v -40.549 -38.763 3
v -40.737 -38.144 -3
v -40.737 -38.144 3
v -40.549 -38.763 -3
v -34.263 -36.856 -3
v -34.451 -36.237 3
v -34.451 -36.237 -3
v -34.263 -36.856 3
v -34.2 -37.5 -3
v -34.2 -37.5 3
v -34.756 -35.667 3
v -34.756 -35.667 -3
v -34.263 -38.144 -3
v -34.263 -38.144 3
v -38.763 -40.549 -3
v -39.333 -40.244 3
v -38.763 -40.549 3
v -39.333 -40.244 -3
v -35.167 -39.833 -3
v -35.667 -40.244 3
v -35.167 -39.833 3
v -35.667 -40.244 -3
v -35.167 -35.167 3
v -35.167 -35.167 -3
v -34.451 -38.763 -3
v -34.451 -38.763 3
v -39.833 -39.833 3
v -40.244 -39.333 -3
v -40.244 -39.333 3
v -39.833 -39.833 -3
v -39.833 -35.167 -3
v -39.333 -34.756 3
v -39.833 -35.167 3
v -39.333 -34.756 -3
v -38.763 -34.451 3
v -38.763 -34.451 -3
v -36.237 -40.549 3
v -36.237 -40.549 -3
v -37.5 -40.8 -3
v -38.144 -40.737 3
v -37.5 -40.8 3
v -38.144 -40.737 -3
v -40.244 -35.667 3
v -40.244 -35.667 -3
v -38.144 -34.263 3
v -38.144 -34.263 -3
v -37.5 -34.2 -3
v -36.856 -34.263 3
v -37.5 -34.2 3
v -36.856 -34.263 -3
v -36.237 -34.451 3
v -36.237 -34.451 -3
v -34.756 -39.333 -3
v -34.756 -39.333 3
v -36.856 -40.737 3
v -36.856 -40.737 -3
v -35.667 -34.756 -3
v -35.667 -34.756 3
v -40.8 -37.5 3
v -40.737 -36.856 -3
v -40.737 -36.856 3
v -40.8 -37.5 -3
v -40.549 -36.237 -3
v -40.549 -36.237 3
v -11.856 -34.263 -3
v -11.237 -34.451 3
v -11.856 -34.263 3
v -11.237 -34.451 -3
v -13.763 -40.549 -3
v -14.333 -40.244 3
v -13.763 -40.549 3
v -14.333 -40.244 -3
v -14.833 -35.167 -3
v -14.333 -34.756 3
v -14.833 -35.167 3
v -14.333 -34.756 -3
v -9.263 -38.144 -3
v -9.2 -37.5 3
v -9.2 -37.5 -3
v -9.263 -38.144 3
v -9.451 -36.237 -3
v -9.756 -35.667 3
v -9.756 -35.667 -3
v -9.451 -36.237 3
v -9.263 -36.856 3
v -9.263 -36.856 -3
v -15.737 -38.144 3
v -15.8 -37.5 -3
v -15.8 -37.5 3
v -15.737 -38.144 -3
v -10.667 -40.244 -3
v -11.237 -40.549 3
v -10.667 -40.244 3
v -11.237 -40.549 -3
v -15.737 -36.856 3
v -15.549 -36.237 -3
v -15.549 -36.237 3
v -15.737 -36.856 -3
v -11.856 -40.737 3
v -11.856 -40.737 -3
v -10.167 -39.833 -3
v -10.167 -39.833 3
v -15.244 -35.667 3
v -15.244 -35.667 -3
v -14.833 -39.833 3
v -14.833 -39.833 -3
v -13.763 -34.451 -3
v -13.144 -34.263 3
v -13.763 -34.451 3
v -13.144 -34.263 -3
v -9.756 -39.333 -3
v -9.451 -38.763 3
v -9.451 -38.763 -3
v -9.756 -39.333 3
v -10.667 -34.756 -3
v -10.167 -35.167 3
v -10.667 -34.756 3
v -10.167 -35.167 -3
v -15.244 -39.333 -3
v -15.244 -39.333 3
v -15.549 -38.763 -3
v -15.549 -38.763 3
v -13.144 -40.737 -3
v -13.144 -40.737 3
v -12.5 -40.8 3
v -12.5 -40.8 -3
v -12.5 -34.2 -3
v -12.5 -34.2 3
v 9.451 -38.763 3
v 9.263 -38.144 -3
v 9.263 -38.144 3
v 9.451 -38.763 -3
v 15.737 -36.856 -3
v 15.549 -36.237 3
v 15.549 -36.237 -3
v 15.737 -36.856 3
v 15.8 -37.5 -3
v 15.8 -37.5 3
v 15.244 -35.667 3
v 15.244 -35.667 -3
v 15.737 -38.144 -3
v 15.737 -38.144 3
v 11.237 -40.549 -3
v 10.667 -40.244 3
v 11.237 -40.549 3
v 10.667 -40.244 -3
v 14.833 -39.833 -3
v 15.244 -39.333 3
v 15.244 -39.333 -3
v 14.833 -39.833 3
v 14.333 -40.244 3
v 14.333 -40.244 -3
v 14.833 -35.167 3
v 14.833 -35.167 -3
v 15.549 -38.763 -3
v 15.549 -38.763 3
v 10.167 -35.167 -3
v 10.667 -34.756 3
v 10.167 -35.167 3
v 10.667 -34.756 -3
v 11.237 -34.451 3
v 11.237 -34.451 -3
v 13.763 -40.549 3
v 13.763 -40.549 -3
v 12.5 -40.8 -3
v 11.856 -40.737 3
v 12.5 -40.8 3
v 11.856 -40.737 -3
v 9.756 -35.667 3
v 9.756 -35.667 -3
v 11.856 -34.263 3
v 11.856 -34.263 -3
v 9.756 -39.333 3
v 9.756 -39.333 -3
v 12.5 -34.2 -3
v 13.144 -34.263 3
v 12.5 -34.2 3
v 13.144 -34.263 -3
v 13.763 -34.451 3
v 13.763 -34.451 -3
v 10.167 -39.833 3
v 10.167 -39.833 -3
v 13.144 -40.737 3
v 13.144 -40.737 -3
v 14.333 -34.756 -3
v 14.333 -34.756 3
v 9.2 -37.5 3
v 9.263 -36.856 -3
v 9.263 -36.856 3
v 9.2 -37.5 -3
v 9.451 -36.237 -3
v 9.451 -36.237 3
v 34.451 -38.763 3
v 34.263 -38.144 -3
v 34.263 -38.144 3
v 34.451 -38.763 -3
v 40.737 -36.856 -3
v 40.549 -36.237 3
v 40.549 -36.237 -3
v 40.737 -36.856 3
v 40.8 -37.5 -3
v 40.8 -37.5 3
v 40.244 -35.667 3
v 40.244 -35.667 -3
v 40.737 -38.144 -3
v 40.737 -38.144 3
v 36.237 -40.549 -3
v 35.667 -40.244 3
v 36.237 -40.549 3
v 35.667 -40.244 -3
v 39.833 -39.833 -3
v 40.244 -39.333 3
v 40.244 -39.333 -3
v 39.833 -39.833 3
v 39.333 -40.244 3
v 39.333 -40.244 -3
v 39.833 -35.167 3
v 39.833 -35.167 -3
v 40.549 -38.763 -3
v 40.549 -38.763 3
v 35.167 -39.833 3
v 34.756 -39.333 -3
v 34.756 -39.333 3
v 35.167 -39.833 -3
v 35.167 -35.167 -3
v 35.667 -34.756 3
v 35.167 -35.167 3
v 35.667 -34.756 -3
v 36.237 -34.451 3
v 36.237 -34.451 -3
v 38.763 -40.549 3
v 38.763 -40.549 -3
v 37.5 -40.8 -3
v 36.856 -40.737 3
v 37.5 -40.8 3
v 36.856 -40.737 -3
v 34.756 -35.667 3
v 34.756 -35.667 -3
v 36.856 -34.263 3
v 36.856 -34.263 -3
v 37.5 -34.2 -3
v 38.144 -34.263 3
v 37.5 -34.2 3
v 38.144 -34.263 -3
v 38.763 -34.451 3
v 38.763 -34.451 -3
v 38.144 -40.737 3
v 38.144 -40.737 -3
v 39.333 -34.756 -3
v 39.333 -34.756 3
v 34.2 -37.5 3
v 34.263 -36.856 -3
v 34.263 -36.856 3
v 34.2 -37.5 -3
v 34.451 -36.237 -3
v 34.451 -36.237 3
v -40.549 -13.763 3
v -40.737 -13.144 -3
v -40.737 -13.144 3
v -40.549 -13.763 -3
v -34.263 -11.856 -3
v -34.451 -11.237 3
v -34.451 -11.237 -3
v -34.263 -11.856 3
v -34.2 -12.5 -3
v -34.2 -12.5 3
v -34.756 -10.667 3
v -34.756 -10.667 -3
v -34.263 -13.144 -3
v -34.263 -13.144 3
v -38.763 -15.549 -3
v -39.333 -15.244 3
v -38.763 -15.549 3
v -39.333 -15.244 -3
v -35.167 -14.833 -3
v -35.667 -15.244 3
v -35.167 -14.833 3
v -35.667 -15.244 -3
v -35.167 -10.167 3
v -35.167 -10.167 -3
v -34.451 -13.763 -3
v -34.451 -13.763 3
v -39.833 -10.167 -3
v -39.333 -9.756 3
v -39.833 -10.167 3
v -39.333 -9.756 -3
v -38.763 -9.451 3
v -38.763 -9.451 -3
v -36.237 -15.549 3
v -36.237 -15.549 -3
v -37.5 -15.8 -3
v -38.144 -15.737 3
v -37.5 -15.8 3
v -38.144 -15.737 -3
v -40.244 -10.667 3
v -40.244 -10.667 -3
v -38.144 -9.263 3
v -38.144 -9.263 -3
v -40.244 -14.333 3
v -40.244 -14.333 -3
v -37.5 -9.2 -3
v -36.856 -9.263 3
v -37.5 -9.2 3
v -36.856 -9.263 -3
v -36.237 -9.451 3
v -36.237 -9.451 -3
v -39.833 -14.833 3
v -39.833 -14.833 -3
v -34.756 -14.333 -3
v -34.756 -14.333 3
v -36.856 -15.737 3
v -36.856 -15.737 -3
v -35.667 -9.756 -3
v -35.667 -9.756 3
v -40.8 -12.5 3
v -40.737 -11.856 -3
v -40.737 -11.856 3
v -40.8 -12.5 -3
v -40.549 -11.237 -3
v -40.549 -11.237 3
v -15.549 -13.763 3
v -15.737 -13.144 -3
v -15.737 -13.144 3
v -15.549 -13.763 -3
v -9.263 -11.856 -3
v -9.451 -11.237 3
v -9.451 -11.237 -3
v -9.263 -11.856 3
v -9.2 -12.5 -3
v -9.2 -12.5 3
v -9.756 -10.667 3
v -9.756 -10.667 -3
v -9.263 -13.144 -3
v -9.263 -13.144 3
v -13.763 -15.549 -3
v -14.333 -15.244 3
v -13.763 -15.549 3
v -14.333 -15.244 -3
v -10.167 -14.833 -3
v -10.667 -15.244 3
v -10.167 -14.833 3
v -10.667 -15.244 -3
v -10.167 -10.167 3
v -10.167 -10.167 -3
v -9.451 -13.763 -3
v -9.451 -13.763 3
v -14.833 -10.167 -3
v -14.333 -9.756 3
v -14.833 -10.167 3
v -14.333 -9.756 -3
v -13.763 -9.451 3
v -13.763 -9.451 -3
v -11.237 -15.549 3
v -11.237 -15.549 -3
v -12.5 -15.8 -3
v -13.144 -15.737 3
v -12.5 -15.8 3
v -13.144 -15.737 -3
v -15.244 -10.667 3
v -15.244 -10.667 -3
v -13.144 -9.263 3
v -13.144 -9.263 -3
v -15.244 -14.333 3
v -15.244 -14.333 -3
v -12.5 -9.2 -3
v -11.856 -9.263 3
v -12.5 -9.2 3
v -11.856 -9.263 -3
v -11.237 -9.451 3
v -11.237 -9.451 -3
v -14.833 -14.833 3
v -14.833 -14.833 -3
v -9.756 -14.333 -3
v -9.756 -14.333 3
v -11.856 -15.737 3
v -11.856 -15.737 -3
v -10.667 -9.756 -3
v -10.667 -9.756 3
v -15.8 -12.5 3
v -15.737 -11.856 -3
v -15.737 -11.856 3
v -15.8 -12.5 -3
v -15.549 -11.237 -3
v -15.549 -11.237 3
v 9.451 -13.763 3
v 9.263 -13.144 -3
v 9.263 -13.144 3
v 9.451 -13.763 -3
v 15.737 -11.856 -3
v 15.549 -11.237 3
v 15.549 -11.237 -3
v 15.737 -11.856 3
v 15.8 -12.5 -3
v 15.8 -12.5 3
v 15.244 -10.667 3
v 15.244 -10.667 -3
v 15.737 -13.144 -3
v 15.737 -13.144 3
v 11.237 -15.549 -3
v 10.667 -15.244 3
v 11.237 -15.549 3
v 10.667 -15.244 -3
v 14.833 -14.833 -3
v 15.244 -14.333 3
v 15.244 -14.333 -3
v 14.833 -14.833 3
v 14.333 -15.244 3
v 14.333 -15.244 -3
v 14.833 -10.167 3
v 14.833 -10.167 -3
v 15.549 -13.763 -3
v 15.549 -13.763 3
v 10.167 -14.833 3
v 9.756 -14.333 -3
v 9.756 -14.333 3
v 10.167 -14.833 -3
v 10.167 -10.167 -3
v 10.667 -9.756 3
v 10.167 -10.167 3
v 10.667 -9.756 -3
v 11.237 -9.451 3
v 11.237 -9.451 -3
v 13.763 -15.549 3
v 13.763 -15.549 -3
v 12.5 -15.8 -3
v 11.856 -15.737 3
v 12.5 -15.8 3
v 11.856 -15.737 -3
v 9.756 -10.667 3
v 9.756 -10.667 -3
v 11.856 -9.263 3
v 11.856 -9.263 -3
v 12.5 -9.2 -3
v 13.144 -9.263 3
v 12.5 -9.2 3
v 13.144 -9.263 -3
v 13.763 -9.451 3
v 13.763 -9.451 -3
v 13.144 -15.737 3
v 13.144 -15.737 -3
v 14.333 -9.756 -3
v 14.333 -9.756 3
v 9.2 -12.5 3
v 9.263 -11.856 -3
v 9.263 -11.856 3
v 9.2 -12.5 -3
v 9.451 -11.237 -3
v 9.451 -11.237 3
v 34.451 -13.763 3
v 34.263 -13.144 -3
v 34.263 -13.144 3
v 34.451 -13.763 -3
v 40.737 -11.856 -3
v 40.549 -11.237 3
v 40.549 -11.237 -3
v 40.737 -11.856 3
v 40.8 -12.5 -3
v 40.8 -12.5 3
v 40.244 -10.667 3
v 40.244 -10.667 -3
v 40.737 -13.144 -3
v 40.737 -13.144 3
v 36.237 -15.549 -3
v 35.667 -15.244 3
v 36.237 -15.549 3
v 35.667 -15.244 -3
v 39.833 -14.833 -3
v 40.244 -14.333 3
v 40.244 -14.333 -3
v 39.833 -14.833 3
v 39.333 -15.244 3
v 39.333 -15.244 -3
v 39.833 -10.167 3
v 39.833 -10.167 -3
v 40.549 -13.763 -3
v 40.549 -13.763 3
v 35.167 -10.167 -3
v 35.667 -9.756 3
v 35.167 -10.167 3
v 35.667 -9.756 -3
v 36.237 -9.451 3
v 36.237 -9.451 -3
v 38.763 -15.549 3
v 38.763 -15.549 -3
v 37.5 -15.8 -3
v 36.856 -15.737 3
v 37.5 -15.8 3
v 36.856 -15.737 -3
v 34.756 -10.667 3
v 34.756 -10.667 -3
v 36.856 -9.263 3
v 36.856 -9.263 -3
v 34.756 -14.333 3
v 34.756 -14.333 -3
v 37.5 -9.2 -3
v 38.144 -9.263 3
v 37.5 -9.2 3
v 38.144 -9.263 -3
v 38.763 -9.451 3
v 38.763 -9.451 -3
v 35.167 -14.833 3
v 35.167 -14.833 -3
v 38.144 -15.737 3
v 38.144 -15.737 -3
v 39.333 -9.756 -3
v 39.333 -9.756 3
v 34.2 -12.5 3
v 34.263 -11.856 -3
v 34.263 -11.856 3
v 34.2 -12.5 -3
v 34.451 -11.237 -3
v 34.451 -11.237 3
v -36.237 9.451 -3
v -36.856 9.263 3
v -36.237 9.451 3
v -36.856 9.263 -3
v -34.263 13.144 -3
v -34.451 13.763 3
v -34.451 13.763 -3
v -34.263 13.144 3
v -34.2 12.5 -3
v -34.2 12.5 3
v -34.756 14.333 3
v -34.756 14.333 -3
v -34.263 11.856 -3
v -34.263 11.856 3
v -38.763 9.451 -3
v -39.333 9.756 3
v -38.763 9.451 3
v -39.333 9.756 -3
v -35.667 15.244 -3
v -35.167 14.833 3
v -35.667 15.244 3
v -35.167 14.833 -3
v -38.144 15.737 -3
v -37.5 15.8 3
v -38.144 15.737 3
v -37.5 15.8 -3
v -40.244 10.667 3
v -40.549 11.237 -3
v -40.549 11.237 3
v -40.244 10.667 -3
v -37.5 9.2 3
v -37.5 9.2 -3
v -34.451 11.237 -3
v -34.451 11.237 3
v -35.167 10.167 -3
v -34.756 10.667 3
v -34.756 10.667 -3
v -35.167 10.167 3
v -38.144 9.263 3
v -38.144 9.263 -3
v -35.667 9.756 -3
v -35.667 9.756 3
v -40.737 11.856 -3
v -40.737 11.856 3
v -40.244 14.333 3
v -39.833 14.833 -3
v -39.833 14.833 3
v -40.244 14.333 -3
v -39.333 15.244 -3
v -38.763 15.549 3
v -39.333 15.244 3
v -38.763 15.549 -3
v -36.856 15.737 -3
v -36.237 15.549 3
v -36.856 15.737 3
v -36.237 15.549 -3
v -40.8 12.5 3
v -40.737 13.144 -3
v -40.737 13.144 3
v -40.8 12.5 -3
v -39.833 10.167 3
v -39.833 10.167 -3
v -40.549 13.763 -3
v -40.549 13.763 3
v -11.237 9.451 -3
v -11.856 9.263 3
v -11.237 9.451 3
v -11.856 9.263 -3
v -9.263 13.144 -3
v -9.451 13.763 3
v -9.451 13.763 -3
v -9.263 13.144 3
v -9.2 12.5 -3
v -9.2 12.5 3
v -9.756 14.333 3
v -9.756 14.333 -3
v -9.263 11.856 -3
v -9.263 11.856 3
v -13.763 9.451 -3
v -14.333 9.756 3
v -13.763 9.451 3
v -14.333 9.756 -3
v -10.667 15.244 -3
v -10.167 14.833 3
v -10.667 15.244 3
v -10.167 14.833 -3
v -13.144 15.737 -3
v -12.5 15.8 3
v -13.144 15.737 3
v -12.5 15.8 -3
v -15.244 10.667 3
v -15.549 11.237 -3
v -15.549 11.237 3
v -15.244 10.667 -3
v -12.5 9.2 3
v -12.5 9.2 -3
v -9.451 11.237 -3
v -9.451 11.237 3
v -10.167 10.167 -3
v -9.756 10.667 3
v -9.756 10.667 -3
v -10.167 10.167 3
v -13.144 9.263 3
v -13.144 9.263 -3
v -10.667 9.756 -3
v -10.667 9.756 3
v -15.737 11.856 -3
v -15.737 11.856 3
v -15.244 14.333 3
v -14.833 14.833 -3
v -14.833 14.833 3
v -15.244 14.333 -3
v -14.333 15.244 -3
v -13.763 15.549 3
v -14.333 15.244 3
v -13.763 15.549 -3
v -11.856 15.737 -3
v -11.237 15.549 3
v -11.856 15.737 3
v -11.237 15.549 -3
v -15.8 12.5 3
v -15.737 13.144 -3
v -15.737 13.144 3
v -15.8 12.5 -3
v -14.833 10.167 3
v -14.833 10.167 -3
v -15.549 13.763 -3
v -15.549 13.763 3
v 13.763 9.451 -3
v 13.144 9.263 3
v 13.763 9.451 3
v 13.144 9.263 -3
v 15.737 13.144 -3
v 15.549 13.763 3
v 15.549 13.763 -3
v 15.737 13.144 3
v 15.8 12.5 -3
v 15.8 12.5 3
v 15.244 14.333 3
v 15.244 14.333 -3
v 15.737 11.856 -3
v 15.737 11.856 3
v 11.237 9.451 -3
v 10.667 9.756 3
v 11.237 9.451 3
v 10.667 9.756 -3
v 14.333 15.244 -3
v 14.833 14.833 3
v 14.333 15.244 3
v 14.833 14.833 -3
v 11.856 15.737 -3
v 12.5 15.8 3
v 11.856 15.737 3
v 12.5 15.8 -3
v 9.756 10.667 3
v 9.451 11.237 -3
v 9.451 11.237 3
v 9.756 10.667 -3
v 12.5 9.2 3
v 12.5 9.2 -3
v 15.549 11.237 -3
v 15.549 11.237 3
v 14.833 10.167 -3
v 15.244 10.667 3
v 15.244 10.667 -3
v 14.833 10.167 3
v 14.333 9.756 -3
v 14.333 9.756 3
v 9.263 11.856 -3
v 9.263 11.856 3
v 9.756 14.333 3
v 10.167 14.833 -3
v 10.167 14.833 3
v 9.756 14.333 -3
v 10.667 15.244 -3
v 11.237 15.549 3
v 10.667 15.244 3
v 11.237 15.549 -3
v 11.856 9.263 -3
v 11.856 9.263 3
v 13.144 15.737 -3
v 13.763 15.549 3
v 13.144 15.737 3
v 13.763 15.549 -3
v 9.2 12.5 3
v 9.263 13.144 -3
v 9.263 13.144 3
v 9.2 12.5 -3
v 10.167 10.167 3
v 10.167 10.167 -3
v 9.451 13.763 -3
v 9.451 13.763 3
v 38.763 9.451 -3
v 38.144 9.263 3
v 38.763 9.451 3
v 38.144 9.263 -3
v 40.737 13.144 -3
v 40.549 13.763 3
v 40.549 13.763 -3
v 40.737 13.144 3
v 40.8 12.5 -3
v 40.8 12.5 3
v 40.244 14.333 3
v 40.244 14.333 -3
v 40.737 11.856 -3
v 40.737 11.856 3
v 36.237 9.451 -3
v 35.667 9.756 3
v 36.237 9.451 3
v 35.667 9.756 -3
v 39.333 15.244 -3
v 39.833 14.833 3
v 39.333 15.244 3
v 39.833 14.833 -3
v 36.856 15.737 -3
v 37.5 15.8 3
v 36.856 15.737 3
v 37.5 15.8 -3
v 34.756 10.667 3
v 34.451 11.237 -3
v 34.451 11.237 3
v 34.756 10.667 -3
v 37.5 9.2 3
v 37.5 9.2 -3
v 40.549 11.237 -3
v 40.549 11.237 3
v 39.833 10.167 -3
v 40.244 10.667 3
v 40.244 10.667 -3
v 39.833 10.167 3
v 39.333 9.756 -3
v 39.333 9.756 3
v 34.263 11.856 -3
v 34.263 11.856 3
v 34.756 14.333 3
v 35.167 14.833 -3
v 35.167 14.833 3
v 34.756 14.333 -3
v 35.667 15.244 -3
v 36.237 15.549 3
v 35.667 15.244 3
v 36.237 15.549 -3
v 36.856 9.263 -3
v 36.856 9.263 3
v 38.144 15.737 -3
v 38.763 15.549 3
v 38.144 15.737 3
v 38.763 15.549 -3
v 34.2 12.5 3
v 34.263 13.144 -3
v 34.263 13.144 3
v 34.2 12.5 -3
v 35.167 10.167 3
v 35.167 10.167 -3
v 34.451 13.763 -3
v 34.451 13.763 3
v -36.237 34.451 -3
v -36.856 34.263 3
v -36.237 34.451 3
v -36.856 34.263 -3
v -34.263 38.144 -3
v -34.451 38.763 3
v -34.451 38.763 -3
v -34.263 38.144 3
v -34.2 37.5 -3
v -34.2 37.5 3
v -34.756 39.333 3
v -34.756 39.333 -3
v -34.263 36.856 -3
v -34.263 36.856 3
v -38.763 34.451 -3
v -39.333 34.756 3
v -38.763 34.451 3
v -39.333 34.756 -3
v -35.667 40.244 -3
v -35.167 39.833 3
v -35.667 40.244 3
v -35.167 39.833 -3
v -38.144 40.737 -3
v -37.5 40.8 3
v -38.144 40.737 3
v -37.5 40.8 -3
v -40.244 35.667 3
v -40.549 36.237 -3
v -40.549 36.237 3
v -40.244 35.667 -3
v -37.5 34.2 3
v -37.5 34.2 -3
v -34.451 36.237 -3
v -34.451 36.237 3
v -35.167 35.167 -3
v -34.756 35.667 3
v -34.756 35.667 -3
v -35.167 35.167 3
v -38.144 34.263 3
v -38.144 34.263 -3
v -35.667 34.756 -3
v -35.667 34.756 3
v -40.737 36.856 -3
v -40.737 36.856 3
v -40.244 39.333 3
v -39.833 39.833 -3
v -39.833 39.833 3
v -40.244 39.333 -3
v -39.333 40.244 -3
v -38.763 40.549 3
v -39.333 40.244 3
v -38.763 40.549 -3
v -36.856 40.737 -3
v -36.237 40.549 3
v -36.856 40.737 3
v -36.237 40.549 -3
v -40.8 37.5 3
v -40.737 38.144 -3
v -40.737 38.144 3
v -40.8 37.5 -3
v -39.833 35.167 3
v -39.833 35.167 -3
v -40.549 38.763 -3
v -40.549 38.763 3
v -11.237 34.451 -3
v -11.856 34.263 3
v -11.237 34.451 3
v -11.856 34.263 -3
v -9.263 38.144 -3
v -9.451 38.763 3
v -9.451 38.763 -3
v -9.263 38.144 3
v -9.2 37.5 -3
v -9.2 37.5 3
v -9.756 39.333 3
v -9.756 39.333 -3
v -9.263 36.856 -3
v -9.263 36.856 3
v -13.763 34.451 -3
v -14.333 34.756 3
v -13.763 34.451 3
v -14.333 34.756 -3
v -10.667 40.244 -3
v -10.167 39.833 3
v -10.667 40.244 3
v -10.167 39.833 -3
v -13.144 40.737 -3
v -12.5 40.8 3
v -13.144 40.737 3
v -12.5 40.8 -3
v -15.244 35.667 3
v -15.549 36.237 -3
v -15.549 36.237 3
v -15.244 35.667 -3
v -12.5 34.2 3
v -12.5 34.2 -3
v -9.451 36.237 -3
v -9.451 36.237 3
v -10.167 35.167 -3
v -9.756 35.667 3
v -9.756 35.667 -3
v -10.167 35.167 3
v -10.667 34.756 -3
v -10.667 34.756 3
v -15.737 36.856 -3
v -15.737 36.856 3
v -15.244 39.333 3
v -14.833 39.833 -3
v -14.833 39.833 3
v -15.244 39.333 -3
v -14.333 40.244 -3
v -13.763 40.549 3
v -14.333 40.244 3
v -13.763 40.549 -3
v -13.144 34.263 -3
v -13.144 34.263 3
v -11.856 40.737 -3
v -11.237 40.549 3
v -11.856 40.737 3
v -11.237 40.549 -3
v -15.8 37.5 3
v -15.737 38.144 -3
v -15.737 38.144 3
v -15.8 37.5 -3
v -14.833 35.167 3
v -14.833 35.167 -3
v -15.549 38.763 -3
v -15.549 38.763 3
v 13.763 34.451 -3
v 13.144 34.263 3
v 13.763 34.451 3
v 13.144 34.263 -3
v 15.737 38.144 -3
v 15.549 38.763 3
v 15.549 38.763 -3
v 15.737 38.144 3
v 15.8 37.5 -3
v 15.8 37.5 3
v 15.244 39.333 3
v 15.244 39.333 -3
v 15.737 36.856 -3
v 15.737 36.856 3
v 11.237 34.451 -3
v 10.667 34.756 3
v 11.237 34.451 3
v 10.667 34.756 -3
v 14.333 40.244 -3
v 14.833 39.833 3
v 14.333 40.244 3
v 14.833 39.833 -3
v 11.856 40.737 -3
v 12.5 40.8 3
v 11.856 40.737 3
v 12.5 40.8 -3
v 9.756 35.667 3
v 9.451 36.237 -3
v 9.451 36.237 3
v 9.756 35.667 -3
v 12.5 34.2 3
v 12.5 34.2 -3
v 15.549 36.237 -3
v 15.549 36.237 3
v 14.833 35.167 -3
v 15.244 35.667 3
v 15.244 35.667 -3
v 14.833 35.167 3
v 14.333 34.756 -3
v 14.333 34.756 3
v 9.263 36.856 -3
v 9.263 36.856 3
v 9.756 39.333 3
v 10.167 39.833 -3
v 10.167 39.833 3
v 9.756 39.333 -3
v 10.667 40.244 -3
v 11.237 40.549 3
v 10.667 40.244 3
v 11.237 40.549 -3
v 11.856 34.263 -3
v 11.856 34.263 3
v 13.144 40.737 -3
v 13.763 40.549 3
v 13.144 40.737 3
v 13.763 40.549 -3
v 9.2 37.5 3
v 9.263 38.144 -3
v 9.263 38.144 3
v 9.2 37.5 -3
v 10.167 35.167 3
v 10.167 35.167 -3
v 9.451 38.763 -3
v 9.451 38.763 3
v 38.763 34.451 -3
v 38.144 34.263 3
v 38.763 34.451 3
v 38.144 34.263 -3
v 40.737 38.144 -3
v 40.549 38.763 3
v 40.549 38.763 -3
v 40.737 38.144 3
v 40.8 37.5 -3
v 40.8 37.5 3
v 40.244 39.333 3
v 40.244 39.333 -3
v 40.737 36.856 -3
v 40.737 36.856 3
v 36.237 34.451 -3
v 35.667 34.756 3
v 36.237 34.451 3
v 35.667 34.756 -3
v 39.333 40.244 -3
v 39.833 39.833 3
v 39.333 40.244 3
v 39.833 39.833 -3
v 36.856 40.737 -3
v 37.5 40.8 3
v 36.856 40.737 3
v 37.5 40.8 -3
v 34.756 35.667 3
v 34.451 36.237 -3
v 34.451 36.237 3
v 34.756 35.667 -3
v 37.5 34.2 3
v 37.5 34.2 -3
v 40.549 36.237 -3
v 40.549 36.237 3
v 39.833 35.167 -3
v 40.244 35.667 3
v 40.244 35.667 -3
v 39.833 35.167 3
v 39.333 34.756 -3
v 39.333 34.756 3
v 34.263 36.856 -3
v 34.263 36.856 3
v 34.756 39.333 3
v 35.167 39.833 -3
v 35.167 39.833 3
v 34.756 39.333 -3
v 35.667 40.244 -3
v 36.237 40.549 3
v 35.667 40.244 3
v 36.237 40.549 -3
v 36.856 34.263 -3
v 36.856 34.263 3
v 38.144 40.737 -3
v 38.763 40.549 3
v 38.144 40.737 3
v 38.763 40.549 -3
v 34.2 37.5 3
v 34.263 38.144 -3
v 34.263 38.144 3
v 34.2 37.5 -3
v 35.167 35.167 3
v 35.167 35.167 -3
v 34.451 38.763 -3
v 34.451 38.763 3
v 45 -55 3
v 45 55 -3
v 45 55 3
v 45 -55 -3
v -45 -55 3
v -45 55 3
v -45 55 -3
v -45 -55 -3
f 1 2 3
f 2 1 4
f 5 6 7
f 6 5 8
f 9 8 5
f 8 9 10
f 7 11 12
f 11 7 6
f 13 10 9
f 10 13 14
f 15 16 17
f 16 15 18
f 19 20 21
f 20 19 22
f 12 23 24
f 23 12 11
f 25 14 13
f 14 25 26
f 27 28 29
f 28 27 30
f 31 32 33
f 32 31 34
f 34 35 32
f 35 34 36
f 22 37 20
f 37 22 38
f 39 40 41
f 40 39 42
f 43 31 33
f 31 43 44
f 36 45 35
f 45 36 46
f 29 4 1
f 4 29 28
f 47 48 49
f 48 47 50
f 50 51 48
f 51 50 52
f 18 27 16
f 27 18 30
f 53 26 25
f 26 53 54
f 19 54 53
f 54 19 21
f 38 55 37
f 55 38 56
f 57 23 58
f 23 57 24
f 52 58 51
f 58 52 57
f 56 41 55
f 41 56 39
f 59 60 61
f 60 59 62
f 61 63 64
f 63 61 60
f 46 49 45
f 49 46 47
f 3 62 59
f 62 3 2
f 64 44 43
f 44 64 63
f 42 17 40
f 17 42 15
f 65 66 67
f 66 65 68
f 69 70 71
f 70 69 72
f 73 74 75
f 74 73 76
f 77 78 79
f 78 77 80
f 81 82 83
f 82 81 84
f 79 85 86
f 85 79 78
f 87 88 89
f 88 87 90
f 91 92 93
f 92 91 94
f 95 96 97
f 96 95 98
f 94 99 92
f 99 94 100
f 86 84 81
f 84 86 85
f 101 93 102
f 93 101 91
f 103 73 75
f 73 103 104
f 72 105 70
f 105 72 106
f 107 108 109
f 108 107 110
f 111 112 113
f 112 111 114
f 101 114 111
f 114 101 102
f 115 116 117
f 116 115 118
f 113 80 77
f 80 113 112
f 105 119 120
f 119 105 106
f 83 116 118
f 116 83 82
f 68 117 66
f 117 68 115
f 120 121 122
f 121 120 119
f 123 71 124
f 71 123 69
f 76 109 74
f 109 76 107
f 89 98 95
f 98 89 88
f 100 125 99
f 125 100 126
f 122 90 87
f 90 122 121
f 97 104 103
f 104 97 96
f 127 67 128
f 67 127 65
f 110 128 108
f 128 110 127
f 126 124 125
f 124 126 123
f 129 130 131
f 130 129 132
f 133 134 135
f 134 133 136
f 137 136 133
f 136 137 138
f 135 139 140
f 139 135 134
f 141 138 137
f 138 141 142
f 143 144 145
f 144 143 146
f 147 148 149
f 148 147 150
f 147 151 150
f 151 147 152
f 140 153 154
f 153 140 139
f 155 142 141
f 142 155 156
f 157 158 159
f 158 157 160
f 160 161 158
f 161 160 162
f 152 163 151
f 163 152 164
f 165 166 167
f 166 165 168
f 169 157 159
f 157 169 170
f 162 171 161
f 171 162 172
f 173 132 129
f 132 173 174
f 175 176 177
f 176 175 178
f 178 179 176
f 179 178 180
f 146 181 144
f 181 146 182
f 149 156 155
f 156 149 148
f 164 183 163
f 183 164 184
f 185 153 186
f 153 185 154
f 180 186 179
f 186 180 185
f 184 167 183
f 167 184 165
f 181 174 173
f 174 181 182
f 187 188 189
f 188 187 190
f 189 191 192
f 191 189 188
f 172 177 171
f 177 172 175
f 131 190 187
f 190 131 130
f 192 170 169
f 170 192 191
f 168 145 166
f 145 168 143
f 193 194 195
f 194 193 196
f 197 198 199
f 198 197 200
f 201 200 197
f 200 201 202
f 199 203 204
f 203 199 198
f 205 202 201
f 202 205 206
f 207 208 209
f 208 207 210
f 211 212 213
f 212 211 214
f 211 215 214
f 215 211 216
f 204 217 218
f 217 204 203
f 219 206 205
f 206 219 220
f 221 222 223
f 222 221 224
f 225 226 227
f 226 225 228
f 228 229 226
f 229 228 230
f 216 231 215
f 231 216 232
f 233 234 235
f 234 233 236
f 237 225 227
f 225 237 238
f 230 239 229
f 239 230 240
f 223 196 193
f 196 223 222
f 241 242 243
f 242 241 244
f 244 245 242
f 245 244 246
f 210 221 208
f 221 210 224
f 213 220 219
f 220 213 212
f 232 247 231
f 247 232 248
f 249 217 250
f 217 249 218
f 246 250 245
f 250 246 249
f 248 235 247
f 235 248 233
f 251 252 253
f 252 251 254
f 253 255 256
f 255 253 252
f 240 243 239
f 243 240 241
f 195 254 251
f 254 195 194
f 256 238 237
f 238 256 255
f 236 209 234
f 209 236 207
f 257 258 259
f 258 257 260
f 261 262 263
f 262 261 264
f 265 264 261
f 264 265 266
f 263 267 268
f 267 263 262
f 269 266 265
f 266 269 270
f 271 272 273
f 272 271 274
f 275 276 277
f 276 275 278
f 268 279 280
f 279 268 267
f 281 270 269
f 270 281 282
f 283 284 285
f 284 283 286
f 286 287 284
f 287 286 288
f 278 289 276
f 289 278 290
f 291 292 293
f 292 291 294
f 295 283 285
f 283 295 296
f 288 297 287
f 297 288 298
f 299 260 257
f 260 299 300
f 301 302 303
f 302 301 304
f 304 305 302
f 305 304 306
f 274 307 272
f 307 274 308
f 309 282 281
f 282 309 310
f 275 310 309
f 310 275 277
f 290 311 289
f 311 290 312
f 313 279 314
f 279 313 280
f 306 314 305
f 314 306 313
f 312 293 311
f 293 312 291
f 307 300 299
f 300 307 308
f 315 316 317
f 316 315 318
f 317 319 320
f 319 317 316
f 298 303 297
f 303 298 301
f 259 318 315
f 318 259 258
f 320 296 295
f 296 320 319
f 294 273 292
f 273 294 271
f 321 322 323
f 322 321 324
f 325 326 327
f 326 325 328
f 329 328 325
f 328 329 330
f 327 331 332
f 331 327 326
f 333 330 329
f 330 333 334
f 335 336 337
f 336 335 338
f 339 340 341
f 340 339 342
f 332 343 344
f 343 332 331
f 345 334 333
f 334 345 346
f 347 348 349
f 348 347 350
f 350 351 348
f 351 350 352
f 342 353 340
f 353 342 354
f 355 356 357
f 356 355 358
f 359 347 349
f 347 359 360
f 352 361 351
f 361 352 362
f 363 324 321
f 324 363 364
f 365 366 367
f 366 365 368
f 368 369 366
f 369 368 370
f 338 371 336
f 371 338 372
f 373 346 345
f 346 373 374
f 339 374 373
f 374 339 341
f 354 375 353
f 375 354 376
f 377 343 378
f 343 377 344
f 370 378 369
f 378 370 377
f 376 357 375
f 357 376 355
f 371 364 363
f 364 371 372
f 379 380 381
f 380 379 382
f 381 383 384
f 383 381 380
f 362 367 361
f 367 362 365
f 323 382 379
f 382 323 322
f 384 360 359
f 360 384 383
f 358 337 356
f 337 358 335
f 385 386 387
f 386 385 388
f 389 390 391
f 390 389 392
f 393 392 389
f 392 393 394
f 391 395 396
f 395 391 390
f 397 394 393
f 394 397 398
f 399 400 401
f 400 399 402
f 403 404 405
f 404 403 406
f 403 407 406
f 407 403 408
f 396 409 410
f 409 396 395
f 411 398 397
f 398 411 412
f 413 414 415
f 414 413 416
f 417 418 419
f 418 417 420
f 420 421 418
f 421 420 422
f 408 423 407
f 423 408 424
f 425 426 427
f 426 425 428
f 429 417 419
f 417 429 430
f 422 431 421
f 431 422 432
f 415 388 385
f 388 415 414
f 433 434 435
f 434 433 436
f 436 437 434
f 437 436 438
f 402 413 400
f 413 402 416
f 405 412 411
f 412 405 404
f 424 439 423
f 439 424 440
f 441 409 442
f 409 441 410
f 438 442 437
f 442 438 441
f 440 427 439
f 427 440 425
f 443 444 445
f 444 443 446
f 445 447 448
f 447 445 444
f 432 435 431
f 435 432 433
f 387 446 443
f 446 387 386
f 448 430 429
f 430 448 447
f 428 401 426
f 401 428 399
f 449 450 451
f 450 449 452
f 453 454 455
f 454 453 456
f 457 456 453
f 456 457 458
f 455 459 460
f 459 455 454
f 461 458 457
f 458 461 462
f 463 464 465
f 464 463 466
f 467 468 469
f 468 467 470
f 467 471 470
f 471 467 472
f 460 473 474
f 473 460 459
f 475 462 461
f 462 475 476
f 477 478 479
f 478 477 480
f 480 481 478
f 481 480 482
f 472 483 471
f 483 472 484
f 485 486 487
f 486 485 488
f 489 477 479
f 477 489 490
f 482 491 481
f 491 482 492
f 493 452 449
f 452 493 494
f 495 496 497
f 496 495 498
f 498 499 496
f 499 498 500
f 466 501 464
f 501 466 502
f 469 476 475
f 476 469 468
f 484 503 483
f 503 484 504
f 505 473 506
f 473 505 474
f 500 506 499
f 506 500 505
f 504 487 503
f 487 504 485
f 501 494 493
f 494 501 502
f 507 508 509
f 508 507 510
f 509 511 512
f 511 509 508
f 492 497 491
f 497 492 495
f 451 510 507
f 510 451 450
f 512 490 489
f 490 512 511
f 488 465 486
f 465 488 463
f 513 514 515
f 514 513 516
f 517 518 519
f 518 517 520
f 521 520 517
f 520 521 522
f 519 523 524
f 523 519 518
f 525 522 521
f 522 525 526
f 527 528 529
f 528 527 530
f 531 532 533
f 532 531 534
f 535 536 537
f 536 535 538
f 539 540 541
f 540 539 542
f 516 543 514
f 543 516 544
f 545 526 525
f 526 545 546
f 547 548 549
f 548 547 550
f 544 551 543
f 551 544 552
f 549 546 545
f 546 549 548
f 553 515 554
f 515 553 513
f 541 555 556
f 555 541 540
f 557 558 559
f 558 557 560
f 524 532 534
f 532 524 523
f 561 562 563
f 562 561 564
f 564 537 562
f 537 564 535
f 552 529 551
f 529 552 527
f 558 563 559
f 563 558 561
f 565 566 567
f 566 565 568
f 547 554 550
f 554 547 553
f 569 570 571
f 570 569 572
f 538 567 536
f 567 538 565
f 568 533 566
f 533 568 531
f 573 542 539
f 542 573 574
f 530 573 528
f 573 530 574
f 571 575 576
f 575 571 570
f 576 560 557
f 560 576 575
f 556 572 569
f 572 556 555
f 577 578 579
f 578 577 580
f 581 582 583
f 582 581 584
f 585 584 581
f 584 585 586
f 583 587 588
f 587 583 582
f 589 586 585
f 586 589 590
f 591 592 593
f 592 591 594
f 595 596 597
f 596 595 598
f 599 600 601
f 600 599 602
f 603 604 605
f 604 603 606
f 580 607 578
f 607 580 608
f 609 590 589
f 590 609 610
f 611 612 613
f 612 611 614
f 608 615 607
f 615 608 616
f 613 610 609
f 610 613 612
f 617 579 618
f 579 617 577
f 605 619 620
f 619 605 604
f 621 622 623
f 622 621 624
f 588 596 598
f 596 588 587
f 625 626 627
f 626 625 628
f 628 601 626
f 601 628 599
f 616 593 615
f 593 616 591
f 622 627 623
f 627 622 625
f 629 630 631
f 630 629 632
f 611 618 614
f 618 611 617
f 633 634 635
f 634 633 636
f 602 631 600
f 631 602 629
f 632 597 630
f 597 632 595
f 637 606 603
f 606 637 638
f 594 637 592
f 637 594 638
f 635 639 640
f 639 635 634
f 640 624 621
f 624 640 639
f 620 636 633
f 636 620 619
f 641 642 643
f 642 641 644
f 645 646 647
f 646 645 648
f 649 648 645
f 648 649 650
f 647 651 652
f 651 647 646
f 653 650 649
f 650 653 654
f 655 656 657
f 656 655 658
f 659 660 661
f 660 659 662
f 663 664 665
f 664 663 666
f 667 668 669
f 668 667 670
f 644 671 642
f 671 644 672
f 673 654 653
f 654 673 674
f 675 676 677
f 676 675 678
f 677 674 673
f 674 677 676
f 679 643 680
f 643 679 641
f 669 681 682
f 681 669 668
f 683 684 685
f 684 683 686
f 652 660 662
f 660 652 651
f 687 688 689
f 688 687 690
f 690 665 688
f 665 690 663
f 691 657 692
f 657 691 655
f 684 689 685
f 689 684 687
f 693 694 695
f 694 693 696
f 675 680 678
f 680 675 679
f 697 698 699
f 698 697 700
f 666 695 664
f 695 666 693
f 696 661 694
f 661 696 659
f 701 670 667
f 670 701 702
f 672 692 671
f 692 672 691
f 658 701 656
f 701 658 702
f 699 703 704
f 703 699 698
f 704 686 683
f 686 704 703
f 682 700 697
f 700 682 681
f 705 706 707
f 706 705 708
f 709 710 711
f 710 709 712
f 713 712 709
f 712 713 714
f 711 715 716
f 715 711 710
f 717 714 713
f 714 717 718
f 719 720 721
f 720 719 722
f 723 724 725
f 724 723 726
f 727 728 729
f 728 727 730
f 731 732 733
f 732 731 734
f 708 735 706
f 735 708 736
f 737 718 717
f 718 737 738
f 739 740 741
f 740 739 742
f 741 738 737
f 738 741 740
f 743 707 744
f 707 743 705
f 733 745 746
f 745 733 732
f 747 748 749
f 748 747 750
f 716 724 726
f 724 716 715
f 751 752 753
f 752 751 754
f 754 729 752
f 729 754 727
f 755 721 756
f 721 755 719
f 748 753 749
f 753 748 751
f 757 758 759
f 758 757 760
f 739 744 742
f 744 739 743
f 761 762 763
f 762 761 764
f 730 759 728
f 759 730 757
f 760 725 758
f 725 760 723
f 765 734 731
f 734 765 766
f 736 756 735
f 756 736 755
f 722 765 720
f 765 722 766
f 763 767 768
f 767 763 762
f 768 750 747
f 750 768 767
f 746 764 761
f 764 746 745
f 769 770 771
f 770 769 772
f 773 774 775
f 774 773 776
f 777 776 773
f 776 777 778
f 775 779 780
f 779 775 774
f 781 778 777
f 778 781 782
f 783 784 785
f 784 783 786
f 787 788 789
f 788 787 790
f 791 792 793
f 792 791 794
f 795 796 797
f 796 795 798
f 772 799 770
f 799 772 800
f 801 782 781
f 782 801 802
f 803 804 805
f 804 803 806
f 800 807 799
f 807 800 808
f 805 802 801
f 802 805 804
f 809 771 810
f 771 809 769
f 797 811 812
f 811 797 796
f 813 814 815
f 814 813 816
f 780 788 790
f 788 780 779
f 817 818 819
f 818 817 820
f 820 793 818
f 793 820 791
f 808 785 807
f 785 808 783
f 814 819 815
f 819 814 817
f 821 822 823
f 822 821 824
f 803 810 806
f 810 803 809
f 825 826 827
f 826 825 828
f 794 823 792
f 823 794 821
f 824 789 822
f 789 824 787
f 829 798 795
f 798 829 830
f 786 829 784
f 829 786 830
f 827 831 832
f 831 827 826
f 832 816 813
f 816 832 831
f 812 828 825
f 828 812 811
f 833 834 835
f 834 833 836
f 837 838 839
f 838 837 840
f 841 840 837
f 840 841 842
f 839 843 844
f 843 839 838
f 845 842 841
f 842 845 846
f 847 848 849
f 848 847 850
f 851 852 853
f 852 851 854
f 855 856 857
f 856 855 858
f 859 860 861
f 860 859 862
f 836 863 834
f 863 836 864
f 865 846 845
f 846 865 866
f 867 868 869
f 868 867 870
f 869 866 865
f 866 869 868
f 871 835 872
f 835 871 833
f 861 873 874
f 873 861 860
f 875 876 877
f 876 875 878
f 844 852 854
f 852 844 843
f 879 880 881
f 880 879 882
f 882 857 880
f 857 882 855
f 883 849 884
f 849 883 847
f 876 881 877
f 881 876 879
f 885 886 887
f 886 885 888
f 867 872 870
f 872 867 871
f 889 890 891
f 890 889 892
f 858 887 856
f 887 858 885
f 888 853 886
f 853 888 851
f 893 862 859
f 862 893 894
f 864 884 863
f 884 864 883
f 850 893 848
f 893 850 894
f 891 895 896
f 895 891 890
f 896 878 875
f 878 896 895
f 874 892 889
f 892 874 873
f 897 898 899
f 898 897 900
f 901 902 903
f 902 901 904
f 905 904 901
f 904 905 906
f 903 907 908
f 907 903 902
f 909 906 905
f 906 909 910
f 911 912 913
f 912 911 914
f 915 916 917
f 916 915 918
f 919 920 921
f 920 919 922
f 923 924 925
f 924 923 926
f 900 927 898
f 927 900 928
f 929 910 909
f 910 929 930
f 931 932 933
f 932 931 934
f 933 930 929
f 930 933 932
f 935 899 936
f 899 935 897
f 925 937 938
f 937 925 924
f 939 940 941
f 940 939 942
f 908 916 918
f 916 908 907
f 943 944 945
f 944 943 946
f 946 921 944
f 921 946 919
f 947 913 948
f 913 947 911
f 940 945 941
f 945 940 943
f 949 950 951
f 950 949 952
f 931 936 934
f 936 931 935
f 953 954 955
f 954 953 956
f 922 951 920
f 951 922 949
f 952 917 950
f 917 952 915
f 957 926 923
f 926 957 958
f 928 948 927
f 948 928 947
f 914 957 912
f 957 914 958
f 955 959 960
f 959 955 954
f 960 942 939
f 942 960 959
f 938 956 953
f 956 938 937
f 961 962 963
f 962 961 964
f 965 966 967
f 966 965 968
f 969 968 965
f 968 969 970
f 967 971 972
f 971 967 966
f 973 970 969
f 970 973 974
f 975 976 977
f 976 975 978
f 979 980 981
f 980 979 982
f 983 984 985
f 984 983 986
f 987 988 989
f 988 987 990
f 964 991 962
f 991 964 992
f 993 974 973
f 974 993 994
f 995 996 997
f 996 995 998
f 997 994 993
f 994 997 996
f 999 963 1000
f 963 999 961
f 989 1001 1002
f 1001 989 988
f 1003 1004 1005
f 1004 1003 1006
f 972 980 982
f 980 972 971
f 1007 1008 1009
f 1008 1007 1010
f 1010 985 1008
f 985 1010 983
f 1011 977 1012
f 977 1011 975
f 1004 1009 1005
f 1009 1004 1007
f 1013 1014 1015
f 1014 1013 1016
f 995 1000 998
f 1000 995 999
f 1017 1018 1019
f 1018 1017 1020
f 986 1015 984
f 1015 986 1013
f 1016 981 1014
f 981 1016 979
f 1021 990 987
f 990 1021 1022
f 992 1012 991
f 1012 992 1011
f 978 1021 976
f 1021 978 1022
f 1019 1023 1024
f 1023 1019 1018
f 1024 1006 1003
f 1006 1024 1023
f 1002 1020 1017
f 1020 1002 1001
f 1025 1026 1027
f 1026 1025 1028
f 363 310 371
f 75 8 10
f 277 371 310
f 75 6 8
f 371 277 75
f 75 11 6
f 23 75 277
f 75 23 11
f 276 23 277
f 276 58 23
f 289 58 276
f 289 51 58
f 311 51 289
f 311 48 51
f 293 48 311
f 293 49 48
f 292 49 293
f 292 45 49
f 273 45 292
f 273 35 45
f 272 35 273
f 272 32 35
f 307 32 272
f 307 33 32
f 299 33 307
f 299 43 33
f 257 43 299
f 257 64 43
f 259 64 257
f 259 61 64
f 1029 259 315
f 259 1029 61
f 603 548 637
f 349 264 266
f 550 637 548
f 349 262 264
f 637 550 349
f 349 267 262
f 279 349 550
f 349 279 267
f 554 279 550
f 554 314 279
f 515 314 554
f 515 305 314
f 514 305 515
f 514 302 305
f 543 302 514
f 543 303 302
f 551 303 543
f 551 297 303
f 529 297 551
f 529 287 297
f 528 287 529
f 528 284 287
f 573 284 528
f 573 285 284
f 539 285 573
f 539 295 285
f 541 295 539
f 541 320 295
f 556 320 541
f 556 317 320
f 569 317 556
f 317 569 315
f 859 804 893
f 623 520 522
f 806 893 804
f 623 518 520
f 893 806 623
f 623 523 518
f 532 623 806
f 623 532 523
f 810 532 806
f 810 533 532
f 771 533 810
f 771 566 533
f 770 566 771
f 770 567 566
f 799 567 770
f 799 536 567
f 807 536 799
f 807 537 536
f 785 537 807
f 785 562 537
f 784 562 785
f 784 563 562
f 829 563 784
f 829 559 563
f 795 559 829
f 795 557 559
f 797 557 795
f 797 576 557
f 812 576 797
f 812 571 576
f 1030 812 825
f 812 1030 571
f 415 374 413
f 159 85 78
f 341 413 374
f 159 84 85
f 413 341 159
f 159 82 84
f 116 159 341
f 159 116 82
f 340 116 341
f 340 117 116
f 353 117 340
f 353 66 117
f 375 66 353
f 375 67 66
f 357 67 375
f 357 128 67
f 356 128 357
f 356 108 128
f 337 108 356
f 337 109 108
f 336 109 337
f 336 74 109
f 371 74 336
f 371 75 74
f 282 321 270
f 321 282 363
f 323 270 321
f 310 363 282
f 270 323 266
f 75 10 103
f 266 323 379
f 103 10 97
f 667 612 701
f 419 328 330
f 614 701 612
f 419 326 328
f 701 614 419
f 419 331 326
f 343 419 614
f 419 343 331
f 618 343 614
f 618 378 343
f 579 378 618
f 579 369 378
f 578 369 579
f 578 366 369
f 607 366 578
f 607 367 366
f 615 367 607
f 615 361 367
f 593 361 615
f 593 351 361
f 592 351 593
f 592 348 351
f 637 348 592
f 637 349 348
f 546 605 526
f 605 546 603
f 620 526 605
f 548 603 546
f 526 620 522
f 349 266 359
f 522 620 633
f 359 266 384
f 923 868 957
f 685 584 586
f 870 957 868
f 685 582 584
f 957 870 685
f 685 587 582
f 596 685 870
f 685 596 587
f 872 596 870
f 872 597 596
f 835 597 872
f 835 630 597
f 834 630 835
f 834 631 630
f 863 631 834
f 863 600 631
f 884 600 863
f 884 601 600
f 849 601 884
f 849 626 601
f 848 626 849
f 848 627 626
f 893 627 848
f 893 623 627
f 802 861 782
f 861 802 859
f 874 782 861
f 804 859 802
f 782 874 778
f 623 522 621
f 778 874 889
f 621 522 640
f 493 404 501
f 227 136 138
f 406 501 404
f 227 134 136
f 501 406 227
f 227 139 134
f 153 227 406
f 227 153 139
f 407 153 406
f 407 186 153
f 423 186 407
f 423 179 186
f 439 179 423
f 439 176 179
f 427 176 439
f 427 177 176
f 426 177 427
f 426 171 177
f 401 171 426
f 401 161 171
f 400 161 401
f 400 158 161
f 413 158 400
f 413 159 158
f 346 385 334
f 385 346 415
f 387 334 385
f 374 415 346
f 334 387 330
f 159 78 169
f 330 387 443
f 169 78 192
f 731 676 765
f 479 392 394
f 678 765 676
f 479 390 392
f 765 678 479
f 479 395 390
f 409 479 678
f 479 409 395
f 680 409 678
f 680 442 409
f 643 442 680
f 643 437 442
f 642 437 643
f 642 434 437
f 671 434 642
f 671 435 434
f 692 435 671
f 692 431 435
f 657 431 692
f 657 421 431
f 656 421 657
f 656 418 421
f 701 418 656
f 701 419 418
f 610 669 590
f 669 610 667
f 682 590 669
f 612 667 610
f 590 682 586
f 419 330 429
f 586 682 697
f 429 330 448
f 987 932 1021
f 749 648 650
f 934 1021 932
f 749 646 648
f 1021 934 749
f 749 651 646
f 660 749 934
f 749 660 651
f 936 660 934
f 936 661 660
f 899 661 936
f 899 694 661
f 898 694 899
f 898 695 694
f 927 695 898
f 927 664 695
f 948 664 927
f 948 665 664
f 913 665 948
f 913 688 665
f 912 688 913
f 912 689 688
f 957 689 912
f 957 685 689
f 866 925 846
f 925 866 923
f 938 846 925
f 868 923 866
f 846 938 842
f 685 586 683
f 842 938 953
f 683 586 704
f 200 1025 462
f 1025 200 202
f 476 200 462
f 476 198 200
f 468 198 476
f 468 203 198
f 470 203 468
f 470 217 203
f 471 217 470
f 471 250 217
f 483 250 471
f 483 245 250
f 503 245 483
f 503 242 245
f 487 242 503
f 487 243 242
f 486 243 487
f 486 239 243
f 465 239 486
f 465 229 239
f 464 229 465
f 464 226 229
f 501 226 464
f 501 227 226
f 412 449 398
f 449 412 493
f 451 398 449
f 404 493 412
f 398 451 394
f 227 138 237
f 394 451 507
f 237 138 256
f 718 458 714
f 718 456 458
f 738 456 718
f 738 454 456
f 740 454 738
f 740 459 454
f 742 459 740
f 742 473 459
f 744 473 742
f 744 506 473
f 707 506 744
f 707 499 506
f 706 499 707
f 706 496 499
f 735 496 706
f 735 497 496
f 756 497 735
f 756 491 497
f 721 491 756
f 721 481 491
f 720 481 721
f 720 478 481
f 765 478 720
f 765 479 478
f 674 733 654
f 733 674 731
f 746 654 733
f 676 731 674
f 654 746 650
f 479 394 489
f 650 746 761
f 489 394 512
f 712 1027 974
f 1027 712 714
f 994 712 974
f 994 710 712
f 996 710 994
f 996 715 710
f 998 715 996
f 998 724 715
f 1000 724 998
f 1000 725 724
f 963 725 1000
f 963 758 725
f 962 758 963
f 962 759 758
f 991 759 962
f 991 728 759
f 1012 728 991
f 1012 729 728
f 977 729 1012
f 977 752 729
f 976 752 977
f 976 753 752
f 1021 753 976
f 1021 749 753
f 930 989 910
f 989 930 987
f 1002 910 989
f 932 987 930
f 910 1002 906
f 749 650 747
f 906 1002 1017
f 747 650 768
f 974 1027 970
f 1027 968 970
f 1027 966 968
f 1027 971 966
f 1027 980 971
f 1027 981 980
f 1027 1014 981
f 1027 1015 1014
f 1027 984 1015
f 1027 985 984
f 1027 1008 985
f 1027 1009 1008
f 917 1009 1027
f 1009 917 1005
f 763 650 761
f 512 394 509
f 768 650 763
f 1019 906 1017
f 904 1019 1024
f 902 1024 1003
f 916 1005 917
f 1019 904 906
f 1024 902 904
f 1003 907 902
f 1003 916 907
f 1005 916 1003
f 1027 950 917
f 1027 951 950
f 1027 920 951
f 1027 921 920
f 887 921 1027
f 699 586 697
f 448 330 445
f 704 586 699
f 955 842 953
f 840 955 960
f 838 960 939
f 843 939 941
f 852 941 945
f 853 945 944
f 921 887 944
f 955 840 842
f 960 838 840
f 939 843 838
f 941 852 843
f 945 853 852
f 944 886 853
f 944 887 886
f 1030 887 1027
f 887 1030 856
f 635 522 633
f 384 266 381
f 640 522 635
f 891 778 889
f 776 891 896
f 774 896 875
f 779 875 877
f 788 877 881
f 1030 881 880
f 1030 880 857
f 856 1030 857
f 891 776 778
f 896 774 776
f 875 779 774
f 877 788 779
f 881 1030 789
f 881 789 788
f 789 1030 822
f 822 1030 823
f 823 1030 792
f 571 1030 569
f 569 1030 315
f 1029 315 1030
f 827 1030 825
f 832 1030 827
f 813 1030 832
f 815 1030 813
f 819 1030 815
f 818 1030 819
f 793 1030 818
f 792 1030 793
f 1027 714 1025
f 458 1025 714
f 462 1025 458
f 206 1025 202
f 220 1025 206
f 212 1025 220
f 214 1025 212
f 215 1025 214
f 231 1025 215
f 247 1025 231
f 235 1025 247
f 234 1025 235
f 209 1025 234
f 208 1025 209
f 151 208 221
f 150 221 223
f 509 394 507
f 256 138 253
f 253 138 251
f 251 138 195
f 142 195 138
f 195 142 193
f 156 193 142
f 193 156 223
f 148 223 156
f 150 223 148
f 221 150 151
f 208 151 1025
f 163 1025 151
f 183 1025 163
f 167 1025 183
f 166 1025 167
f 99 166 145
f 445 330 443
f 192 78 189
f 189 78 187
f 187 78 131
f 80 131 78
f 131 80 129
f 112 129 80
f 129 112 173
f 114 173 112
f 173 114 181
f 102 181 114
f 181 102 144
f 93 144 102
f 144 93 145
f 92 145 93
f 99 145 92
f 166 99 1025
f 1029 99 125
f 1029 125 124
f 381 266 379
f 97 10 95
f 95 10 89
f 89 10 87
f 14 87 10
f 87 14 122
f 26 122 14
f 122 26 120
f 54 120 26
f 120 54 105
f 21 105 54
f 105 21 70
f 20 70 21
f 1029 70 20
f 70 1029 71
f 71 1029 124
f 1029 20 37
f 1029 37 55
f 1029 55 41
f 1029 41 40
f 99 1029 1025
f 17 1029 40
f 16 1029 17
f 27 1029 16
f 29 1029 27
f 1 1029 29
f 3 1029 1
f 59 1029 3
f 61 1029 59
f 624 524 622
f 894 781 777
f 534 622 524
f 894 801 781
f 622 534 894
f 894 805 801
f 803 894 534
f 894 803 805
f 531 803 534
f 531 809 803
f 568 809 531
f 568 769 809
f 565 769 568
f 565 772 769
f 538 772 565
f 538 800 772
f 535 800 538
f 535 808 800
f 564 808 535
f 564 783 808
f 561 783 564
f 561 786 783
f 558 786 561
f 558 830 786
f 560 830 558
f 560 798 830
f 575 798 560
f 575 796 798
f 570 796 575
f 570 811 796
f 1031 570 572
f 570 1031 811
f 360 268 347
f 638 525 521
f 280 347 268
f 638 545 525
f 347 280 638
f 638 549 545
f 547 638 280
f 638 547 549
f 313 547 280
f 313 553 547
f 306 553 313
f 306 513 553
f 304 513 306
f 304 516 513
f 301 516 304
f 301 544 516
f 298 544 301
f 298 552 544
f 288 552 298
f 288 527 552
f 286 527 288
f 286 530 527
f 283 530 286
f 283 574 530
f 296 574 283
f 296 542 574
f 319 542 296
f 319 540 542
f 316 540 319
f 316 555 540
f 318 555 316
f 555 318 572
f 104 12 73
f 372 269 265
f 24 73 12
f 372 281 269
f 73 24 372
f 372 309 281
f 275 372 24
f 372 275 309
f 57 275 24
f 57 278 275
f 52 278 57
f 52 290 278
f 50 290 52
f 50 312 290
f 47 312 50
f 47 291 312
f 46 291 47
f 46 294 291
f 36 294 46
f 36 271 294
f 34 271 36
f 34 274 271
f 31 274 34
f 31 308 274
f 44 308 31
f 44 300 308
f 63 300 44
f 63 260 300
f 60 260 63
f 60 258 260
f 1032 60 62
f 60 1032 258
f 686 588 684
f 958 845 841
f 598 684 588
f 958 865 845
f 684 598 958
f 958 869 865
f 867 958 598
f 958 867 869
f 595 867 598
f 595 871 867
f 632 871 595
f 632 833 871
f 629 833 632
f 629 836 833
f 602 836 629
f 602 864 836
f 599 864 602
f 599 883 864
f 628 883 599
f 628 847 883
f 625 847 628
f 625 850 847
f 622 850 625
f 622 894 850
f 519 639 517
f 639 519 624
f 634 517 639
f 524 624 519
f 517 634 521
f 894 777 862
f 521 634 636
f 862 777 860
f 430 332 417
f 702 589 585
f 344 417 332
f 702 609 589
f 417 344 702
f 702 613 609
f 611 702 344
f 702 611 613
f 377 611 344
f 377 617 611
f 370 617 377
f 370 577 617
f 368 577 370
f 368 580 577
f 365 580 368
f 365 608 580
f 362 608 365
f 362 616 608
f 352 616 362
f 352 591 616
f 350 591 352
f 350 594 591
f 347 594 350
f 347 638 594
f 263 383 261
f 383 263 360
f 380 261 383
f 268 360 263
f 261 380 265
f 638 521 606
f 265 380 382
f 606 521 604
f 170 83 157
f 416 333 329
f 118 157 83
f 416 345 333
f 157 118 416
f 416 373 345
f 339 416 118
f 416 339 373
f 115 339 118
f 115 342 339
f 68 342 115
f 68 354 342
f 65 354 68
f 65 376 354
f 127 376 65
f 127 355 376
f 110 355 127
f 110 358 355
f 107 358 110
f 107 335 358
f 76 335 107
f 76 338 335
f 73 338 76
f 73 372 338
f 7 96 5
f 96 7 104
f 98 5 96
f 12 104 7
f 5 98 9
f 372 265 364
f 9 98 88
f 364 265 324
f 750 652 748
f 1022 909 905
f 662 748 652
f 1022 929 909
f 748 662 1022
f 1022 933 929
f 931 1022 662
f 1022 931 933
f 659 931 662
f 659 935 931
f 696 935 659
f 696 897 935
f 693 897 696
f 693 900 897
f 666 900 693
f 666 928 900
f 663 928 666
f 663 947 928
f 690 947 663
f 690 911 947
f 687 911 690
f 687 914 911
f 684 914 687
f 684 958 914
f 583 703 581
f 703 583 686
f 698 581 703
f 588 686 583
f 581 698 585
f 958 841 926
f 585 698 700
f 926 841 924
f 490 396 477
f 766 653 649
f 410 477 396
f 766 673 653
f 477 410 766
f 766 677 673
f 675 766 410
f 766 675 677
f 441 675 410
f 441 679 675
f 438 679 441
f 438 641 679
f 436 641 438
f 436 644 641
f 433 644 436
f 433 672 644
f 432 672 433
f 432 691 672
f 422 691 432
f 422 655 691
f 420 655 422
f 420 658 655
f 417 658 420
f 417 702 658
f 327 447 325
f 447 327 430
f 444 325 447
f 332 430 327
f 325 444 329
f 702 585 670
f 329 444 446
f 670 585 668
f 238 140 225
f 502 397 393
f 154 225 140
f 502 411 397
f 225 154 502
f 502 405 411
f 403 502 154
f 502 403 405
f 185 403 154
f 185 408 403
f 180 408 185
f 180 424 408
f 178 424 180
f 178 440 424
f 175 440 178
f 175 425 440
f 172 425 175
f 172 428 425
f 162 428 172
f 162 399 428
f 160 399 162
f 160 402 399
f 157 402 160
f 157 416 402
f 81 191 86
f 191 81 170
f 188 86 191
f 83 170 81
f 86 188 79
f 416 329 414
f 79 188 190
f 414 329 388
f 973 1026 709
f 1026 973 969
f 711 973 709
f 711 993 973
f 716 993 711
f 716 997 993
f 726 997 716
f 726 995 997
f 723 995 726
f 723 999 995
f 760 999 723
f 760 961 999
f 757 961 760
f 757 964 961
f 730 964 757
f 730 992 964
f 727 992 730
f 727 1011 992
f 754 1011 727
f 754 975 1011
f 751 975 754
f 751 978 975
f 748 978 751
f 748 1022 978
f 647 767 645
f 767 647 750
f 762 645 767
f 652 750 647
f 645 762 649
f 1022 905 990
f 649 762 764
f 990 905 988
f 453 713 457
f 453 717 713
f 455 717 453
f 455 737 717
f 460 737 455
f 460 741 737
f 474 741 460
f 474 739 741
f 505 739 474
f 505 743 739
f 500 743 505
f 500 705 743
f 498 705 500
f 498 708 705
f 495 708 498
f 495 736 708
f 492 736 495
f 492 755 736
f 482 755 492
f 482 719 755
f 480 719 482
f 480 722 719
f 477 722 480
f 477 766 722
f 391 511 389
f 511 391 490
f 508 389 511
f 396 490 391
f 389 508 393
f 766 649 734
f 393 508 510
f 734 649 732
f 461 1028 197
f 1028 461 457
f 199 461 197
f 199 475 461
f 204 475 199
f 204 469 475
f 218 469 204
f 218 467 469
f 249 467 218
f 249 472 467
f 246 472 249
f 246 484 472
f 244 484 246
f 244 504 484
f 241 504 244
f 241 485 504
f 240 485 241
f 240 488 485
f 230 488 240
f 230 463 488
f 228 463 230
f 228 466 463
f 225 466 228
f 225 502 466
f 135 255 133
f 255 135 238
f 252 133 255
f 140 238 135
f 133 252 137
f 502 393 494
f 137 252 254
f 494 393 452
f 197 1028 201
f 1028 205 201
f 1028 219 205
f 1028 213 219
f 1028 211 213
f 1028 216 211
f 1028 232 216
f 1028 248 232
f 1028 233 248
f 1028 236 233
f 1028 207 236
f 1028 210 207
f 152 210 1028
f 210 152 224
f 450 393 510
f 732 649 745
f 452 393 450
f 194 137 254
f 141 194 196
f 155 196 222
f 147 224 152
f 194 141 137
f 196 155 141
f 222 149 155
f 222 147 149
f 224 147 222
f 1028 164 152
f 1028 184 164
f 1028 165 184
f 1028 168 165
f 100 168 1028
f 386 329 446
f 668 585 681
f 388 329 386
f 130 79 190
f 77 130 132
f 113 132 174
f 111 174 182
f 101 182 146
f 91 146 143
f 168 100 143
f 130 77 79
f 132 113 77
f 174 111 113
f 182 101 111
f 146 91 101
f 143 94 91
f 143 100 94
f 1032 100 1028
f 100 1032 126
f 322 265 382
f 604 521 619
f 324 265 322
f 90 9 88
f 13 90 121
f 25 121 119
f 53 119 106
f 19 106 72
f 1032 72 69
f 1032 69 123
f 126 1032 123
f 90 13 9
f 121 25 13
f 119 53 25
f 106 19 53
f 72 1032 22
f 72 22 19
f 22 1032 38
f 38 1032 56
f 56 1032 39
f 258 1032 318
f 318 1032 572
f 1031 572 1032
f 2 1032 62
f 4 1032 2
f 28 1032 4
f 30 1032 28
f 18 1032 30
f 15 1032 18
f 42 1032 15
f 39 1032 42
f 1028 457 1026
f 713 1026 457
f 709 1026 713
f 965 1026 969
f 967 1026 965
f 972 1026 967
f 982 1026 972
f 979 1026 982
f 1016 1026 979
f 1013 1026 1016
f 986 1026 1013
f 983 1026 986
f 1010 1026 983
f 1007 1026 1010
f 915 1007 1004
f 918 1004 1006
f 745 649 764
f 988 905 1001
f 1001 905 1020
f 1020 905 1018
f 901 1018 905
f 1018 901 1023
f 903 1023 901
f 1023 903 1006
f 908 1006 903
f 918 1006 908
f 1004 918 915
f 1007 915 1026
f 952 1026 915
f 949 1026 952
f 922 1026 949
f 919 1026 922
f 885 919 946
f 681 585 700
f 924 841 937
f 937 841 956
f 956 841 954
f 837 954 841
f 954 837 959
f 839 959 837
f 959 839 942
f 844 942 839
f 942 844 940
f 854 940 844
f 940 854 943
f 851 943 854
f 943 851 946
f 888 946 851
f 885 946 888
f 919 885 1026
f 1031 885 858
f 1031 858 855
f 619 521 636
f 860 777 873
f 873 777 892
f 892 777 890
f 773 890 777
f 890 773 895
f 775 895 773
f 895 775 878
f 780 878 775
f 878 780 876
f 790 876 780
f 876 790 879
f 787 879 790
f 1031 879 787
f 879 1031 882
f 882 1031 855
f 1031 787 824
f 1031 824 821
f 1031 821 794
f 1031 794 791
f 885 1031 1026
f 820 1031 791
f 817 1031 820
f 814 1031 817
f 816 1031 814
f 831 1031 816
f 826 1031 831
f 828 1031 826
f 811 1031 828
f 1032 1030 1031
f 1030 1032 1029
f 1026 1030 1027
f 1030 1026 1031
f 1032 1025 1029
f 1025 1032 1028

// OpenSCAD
$fn = 32;

// ----------------------------------------------------------------------
// Perforated panel 90 x 110 x 6
// 4 x 4 Ø6.6 holes, grid layout
// ----------------------------------------------------------------------

// --- parameters (mm) ---
panel = [90, 110, 6];  // overall size (x, y, z)
hole_d = 6.6;          // hole diameter
pitch_x = 25;          // hole pitch along X
pitch_y = 25;          // hole pitch along Y

// --- derived feature positions (mm) ---
margin = hole_d / 2 + 2;            // = 5.3   clearance from the panel edge
cols = floor((panel[0] - 2 * margin) / pitch_x) + 1;  // = 4   how many columns fit in X
rows = floor((panel[1] - 2 * margin) / pitch_y) + 1;  // = 4   how many rows fit in Y
span_x = (cols - 1) * pitch_x + 0;  // = 75   width of the field
span_y = (rows - 1) * pitch_y;      // = 75   height of the field
origin_x = -span_x / 2;             // = -37.5   X of the first hole
origin_y = -span_y / 2;             // = -37.5   Y of the first row
holes = rows * cols;                // = 16   holes in total
feature_centers = [
  [origin_x + 0 * pitch_x, origin_y + 0 * pitch_y],
  [origin_x + 1 * pitch_x, origin_y + 0 * pitch_y],
  [origin_x + 2 * pitch_x, origin_y + 0 * pitch_y],
  [origin_x + 3 * pitch_x, origin_y + 0 * pitch_y],
  [origin_x + 0 * pitch_x, origin_y + 1 * pitch_y],
  [origin_x + 1 * pitch_x, origin_y + 1 * pitch_y],
  [origin_x + 2 * pitch_x, origin_y + 1 * pitch_y],
  [origin_x + 3 * pitch_x, origin_y + 1 * pitch_y],
  [origin_x + 0 * pitch_x, origin_y + 2 * pitch_y],
  [origin_x + 1 * pitch_x, origin_y + 2 * pitch_y],
  [origin_x + 2 * pitch_x, origin_y + 2 * pitch_y],
  [origin_x + 3 * pitch_x, origin_y + 2 * pitch_y],
  [origin_x + 0 * pitch_x, origin_y + 3 * pitch_y],
  [origin_x + 1 * pitch_x, origin_y + 3 * pitch_y],
  [origin_x + 2 * pitch_x, origin_y + 3 * pitch_y],
  [origin_x + 3 * pitch_x, origin_y + 3 * pitch_y]
];   // hole centres, used verbatim by the cutter loop

// panel outline, every hole through
difference() {
  cube(panel, center = true);
  for (centre = feature_centers)
    translate([centre[0], centre[1], 0])
      cylinder(d = hole_d, h = panel[2] + 2, center = true);
}
